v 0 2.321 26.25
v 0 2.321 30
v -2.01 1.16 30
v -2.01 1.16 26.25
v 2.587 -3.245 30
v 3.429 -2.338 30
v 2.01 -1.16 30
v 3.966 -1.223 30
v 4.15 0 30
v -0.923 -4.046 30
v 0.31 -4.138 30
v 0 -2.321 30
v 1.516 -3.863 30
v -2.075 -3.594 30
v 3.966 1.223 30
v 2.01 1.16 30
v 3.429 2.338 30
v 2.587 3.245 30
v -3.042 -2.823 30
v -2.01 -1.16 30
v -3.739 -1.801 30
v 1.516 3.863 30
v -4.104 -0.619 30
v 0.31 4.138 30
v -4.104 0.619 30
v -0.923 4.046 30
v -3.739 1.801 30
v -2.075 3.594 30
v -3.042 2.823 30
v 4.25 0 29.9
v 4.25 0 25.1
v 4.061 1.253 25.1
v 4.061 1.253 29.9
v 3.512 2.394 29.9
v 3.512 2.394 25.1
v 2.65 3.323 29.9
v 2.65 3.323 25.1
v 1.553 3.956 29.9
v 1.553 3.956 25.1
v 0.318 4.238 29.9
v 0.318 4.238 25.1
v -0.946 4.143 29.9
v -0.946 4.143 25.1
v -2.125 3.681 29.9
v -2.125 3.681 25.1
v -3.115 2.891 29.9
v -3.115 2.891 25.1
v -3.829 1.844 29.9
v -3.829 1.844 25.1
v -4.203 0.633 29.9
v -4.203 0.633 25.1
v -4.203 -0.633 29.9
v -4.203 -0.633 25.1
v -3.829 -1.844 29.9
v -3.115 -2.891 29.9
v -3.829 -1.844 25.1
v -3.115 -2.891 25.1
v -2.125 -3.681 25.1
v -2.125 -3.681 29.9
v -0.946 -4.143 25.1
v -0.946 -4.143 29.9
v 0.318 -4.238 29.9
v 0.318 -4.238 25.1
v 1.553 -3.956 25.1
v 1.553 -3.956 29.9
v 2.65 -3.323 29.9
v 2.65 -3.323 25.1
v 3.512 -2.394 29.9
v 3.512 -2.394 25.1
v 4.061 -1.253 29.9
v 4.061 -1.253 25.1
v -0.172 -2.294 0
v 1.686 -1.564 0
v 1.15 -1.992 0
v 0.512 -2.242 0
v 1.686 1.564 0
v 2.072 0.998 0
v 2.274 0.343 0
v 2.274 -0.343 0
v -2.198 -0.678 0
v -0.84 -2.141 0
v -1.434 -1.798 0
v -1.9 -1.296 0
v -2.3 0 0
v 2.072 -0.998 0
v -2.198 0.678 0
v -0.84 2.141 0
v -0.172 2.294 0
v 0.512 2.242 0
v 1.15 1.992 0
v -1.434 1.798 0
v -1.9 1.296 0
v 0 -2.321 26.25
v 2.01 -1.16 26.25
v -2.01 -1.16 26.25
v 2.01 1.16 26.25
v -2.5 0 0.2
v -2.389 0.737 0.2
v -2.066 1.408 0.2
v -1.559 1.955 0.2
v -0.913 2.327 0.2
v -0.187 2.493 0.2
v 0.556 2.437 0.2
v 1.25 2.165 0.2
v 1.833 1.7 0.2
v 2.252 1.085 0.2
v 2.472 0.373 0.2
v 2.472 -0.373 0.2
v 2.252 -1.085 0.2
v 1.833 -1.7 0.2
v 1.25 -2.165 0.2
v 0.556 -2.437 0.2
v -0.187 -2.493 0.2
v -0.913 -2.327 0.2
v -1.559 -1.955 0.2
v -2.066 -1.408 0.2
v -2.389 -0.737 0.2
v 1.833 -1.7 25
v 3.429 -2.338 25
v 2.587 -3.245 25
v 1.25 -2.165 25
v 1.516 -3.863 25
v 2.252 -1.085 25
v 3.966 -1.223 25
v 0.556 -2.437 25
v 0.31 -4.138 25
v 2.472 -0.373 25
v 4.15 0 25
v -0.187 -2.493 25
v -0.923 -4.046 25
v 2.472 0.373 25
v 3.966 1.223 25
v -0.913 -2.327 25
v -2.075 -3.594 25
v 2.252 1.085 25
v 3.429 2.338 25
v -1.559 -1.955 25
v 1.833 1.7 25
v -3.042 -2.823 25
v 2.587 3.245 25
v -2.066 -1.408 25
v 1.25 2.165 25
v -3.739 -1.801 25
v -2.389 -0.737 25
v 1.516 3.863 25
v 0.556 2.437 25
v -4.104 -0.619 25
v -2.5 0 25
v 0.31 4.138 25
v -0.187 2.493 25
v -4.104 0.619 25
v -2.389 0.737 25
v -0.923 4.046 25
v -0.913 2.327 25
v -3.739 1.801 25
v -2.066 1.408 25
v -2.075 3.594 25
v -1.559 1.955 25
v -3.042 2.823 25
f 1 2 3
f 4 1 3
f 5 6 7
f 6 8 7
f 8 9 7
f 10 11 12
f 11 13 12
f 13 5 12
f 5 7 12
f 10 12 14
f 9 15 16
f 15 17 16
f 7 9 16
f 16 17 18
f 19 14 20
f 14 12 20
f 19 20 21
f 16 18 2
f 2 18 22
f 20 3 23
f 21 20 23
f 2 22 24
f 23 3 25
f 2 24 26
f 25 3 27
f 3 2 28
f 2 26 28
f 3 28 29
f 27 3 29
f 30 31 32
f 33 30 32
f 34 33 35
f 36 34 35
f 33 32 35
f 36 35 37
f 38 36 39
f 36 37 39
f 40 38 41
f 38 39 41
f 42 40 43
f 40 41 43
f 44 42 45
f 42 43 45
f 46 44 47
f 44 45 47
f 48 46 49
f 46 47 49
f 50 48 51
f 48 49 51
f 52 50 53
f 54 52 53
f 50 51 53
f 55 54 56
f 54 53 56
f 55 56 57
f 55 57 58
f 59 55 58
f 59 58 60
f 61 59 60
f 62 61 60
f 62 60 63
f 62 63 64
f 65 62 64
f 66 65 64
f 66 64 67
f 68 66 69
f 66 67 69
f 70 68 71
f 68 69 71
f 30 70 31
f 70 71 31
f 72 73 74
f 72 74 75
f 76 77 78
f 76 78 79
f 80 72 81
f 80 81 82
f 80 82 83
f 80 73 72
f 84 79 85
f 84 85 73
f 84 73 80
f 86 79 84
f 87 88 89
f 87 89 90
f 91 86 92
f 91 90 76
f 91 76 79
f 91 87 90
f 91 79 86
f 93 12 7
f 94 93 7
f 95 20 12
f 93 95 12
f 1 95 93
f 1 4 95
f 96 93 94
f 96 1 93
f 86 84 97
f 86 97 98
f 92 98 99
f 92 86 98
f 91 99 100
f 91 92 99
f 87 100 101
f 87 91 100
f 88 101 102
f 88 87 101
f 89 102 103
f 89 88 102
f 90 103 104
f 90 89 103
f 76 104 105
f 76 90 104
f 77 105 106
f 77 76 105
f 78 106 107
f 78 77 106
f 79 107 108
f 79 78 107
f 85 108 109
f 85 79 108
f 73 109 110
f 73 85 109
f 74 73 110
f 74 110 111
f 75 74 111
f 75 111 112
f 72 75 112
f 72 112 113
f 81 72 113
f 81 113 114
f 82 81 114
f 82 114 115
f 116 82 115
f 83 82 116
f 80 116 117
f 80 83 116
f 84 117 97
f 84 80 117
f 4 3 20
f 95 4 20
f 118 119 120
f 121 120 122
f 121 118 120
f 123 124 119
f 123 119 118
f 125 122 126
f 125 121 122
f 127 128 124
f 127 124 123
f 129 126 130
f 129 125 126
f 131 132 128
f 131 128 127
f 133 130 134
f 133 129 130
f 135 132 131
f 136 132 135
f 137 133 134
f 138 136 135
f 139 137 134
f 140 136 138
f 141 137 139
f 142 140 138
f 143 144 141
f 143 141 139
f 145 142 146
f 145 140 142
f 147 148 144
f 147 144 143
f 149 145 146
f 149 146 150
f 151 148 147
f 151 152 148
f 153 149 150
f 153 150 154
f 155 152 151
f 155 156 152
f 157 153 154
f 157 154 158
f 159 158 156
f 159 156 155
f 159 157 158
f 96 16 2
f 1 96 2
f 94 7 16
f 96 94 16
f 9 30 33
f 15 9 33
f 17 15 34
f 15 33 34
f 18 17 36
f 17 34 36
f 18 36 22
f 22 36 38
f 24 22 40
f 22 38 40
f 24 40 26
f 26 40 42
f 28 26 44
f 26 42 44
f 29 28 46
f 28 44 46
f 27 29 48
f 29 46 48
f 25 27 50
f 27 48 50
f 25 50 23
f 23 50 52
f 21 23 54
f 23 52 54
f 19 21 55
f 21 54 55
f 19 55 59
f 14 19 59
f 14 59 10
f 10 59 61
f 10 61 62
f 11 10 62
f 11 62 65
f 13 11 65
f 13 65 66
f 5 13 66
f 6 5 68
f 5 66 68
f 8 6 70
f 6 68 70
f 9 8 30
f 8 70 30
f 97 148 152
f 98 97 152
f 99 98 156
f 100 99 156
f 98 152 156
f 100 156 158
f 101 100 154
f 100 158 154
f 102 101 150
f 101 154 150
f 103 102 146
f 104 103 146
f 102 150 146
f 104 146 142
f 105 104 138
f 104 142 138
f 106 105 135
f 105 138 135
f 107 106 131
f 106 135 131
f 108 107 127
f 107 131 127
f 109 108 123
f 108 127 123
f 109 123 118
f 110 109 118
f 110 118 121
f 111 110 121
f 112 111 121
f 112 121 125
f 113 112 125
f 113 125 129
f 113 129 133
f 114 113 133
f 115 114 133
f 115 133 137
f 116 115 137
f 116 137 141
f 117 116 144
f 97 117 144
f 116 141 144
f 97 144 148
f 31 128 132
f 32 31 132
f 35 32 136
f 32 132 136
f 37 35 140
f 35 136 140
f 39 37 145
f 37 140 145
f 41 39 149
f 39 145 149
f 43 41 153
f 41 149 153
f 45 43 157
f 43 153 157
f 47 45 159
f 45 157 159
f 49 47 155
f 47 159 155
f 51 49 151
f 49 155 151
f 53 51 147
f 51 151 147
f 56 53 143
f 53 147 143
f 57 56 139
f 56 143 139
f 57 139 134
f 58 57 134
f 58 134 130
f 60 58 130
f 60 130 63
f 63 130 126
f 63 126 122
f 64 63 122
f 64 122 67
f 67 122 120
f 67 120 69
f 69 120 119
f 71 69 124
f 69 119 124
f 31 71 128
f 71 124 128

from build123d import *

# Parameters (mm, degrees)
SKETCH_1_W          = 4.25
SKETCH_1_H          = 5
SKETCH_2_R          = 2.5
EXTRUDE_1_DEPTH     = 25
CUT_EXTRUDE_1_DEPTH = 3.75
CHAMFER_1_SIZE2     = 0.100002106
CHAMFER_1_SIZE      = 0.100002056
CHAMFER_2_SIZE      = 0.200033753
CHAMFER_2_SIZE2     = 0.200036689


with BuildPart() as part:
    # 草图1 → 旋转1 (revolve)
    with BuildSketch(Plane(origin=(0, 0, 0), x_dir=(1, 0, 0), z_dir=(0, 1, 0))):
        with Locations((2.125, -27.5)):
            Rectangle(SKETCH_1_W, SKETCH_1_H)
    revolve(axis=Axis((0, 0, 25), (0, 0, 1)))

    # 草图2 → 凸台-拉伸1 (add)
    with BuildSketch(Plane(origin=(0, 0, 25), x_dir=(-1, 0, 0), z_dir=(0, 0, -1))):
        Circle(SKETCH_2_R)
    extrude(amount=EXTRUDE_1_DEPTH)

    # 草图3 → 切除-拉伸1 (cut)
    with BuildSketch(Plane.XY.offset(30)):
        Polygon((-2.01, -1.160474041), (0, -2.320948082), (2.01, -1.160474041), (2.01, 1.160474041), (0, 2.320948082), (-2.01, 1.160474041), align=None)
    extrude(amount=-CUT_EXTRUDE_1_DEPTH, mode=Mode.SUBTRACT)

    # 倒角1
    chamfer_1_edges = [part.edges().sort_by_distance(p)[0] for p in [
        (-4.25, 0, 30),
        (-4.25, 0, 25),
    ]]
    chamfer(chamfer_1_edges, length=CHAMFER_1_SIZE, length2=CHAMFER_1_SIZE2)

    # 倒角2
    chamfer_2_edges = [part.edges().sort_by_distance(p)[0] for p in [
        (2.5, 0, 0),
    ]]
    chamfer_2_side = [part.faces().sort_by_distance(p)[0] for p in [
        (2.5, 0, 12.5),
    ]]
    chamfer(chamfer_2_edges, length=CHAMFER_2_SIZE, length2=CHAMFER_2_SIZE2, reference=chamfer_2_side[0])


solid = part.part
